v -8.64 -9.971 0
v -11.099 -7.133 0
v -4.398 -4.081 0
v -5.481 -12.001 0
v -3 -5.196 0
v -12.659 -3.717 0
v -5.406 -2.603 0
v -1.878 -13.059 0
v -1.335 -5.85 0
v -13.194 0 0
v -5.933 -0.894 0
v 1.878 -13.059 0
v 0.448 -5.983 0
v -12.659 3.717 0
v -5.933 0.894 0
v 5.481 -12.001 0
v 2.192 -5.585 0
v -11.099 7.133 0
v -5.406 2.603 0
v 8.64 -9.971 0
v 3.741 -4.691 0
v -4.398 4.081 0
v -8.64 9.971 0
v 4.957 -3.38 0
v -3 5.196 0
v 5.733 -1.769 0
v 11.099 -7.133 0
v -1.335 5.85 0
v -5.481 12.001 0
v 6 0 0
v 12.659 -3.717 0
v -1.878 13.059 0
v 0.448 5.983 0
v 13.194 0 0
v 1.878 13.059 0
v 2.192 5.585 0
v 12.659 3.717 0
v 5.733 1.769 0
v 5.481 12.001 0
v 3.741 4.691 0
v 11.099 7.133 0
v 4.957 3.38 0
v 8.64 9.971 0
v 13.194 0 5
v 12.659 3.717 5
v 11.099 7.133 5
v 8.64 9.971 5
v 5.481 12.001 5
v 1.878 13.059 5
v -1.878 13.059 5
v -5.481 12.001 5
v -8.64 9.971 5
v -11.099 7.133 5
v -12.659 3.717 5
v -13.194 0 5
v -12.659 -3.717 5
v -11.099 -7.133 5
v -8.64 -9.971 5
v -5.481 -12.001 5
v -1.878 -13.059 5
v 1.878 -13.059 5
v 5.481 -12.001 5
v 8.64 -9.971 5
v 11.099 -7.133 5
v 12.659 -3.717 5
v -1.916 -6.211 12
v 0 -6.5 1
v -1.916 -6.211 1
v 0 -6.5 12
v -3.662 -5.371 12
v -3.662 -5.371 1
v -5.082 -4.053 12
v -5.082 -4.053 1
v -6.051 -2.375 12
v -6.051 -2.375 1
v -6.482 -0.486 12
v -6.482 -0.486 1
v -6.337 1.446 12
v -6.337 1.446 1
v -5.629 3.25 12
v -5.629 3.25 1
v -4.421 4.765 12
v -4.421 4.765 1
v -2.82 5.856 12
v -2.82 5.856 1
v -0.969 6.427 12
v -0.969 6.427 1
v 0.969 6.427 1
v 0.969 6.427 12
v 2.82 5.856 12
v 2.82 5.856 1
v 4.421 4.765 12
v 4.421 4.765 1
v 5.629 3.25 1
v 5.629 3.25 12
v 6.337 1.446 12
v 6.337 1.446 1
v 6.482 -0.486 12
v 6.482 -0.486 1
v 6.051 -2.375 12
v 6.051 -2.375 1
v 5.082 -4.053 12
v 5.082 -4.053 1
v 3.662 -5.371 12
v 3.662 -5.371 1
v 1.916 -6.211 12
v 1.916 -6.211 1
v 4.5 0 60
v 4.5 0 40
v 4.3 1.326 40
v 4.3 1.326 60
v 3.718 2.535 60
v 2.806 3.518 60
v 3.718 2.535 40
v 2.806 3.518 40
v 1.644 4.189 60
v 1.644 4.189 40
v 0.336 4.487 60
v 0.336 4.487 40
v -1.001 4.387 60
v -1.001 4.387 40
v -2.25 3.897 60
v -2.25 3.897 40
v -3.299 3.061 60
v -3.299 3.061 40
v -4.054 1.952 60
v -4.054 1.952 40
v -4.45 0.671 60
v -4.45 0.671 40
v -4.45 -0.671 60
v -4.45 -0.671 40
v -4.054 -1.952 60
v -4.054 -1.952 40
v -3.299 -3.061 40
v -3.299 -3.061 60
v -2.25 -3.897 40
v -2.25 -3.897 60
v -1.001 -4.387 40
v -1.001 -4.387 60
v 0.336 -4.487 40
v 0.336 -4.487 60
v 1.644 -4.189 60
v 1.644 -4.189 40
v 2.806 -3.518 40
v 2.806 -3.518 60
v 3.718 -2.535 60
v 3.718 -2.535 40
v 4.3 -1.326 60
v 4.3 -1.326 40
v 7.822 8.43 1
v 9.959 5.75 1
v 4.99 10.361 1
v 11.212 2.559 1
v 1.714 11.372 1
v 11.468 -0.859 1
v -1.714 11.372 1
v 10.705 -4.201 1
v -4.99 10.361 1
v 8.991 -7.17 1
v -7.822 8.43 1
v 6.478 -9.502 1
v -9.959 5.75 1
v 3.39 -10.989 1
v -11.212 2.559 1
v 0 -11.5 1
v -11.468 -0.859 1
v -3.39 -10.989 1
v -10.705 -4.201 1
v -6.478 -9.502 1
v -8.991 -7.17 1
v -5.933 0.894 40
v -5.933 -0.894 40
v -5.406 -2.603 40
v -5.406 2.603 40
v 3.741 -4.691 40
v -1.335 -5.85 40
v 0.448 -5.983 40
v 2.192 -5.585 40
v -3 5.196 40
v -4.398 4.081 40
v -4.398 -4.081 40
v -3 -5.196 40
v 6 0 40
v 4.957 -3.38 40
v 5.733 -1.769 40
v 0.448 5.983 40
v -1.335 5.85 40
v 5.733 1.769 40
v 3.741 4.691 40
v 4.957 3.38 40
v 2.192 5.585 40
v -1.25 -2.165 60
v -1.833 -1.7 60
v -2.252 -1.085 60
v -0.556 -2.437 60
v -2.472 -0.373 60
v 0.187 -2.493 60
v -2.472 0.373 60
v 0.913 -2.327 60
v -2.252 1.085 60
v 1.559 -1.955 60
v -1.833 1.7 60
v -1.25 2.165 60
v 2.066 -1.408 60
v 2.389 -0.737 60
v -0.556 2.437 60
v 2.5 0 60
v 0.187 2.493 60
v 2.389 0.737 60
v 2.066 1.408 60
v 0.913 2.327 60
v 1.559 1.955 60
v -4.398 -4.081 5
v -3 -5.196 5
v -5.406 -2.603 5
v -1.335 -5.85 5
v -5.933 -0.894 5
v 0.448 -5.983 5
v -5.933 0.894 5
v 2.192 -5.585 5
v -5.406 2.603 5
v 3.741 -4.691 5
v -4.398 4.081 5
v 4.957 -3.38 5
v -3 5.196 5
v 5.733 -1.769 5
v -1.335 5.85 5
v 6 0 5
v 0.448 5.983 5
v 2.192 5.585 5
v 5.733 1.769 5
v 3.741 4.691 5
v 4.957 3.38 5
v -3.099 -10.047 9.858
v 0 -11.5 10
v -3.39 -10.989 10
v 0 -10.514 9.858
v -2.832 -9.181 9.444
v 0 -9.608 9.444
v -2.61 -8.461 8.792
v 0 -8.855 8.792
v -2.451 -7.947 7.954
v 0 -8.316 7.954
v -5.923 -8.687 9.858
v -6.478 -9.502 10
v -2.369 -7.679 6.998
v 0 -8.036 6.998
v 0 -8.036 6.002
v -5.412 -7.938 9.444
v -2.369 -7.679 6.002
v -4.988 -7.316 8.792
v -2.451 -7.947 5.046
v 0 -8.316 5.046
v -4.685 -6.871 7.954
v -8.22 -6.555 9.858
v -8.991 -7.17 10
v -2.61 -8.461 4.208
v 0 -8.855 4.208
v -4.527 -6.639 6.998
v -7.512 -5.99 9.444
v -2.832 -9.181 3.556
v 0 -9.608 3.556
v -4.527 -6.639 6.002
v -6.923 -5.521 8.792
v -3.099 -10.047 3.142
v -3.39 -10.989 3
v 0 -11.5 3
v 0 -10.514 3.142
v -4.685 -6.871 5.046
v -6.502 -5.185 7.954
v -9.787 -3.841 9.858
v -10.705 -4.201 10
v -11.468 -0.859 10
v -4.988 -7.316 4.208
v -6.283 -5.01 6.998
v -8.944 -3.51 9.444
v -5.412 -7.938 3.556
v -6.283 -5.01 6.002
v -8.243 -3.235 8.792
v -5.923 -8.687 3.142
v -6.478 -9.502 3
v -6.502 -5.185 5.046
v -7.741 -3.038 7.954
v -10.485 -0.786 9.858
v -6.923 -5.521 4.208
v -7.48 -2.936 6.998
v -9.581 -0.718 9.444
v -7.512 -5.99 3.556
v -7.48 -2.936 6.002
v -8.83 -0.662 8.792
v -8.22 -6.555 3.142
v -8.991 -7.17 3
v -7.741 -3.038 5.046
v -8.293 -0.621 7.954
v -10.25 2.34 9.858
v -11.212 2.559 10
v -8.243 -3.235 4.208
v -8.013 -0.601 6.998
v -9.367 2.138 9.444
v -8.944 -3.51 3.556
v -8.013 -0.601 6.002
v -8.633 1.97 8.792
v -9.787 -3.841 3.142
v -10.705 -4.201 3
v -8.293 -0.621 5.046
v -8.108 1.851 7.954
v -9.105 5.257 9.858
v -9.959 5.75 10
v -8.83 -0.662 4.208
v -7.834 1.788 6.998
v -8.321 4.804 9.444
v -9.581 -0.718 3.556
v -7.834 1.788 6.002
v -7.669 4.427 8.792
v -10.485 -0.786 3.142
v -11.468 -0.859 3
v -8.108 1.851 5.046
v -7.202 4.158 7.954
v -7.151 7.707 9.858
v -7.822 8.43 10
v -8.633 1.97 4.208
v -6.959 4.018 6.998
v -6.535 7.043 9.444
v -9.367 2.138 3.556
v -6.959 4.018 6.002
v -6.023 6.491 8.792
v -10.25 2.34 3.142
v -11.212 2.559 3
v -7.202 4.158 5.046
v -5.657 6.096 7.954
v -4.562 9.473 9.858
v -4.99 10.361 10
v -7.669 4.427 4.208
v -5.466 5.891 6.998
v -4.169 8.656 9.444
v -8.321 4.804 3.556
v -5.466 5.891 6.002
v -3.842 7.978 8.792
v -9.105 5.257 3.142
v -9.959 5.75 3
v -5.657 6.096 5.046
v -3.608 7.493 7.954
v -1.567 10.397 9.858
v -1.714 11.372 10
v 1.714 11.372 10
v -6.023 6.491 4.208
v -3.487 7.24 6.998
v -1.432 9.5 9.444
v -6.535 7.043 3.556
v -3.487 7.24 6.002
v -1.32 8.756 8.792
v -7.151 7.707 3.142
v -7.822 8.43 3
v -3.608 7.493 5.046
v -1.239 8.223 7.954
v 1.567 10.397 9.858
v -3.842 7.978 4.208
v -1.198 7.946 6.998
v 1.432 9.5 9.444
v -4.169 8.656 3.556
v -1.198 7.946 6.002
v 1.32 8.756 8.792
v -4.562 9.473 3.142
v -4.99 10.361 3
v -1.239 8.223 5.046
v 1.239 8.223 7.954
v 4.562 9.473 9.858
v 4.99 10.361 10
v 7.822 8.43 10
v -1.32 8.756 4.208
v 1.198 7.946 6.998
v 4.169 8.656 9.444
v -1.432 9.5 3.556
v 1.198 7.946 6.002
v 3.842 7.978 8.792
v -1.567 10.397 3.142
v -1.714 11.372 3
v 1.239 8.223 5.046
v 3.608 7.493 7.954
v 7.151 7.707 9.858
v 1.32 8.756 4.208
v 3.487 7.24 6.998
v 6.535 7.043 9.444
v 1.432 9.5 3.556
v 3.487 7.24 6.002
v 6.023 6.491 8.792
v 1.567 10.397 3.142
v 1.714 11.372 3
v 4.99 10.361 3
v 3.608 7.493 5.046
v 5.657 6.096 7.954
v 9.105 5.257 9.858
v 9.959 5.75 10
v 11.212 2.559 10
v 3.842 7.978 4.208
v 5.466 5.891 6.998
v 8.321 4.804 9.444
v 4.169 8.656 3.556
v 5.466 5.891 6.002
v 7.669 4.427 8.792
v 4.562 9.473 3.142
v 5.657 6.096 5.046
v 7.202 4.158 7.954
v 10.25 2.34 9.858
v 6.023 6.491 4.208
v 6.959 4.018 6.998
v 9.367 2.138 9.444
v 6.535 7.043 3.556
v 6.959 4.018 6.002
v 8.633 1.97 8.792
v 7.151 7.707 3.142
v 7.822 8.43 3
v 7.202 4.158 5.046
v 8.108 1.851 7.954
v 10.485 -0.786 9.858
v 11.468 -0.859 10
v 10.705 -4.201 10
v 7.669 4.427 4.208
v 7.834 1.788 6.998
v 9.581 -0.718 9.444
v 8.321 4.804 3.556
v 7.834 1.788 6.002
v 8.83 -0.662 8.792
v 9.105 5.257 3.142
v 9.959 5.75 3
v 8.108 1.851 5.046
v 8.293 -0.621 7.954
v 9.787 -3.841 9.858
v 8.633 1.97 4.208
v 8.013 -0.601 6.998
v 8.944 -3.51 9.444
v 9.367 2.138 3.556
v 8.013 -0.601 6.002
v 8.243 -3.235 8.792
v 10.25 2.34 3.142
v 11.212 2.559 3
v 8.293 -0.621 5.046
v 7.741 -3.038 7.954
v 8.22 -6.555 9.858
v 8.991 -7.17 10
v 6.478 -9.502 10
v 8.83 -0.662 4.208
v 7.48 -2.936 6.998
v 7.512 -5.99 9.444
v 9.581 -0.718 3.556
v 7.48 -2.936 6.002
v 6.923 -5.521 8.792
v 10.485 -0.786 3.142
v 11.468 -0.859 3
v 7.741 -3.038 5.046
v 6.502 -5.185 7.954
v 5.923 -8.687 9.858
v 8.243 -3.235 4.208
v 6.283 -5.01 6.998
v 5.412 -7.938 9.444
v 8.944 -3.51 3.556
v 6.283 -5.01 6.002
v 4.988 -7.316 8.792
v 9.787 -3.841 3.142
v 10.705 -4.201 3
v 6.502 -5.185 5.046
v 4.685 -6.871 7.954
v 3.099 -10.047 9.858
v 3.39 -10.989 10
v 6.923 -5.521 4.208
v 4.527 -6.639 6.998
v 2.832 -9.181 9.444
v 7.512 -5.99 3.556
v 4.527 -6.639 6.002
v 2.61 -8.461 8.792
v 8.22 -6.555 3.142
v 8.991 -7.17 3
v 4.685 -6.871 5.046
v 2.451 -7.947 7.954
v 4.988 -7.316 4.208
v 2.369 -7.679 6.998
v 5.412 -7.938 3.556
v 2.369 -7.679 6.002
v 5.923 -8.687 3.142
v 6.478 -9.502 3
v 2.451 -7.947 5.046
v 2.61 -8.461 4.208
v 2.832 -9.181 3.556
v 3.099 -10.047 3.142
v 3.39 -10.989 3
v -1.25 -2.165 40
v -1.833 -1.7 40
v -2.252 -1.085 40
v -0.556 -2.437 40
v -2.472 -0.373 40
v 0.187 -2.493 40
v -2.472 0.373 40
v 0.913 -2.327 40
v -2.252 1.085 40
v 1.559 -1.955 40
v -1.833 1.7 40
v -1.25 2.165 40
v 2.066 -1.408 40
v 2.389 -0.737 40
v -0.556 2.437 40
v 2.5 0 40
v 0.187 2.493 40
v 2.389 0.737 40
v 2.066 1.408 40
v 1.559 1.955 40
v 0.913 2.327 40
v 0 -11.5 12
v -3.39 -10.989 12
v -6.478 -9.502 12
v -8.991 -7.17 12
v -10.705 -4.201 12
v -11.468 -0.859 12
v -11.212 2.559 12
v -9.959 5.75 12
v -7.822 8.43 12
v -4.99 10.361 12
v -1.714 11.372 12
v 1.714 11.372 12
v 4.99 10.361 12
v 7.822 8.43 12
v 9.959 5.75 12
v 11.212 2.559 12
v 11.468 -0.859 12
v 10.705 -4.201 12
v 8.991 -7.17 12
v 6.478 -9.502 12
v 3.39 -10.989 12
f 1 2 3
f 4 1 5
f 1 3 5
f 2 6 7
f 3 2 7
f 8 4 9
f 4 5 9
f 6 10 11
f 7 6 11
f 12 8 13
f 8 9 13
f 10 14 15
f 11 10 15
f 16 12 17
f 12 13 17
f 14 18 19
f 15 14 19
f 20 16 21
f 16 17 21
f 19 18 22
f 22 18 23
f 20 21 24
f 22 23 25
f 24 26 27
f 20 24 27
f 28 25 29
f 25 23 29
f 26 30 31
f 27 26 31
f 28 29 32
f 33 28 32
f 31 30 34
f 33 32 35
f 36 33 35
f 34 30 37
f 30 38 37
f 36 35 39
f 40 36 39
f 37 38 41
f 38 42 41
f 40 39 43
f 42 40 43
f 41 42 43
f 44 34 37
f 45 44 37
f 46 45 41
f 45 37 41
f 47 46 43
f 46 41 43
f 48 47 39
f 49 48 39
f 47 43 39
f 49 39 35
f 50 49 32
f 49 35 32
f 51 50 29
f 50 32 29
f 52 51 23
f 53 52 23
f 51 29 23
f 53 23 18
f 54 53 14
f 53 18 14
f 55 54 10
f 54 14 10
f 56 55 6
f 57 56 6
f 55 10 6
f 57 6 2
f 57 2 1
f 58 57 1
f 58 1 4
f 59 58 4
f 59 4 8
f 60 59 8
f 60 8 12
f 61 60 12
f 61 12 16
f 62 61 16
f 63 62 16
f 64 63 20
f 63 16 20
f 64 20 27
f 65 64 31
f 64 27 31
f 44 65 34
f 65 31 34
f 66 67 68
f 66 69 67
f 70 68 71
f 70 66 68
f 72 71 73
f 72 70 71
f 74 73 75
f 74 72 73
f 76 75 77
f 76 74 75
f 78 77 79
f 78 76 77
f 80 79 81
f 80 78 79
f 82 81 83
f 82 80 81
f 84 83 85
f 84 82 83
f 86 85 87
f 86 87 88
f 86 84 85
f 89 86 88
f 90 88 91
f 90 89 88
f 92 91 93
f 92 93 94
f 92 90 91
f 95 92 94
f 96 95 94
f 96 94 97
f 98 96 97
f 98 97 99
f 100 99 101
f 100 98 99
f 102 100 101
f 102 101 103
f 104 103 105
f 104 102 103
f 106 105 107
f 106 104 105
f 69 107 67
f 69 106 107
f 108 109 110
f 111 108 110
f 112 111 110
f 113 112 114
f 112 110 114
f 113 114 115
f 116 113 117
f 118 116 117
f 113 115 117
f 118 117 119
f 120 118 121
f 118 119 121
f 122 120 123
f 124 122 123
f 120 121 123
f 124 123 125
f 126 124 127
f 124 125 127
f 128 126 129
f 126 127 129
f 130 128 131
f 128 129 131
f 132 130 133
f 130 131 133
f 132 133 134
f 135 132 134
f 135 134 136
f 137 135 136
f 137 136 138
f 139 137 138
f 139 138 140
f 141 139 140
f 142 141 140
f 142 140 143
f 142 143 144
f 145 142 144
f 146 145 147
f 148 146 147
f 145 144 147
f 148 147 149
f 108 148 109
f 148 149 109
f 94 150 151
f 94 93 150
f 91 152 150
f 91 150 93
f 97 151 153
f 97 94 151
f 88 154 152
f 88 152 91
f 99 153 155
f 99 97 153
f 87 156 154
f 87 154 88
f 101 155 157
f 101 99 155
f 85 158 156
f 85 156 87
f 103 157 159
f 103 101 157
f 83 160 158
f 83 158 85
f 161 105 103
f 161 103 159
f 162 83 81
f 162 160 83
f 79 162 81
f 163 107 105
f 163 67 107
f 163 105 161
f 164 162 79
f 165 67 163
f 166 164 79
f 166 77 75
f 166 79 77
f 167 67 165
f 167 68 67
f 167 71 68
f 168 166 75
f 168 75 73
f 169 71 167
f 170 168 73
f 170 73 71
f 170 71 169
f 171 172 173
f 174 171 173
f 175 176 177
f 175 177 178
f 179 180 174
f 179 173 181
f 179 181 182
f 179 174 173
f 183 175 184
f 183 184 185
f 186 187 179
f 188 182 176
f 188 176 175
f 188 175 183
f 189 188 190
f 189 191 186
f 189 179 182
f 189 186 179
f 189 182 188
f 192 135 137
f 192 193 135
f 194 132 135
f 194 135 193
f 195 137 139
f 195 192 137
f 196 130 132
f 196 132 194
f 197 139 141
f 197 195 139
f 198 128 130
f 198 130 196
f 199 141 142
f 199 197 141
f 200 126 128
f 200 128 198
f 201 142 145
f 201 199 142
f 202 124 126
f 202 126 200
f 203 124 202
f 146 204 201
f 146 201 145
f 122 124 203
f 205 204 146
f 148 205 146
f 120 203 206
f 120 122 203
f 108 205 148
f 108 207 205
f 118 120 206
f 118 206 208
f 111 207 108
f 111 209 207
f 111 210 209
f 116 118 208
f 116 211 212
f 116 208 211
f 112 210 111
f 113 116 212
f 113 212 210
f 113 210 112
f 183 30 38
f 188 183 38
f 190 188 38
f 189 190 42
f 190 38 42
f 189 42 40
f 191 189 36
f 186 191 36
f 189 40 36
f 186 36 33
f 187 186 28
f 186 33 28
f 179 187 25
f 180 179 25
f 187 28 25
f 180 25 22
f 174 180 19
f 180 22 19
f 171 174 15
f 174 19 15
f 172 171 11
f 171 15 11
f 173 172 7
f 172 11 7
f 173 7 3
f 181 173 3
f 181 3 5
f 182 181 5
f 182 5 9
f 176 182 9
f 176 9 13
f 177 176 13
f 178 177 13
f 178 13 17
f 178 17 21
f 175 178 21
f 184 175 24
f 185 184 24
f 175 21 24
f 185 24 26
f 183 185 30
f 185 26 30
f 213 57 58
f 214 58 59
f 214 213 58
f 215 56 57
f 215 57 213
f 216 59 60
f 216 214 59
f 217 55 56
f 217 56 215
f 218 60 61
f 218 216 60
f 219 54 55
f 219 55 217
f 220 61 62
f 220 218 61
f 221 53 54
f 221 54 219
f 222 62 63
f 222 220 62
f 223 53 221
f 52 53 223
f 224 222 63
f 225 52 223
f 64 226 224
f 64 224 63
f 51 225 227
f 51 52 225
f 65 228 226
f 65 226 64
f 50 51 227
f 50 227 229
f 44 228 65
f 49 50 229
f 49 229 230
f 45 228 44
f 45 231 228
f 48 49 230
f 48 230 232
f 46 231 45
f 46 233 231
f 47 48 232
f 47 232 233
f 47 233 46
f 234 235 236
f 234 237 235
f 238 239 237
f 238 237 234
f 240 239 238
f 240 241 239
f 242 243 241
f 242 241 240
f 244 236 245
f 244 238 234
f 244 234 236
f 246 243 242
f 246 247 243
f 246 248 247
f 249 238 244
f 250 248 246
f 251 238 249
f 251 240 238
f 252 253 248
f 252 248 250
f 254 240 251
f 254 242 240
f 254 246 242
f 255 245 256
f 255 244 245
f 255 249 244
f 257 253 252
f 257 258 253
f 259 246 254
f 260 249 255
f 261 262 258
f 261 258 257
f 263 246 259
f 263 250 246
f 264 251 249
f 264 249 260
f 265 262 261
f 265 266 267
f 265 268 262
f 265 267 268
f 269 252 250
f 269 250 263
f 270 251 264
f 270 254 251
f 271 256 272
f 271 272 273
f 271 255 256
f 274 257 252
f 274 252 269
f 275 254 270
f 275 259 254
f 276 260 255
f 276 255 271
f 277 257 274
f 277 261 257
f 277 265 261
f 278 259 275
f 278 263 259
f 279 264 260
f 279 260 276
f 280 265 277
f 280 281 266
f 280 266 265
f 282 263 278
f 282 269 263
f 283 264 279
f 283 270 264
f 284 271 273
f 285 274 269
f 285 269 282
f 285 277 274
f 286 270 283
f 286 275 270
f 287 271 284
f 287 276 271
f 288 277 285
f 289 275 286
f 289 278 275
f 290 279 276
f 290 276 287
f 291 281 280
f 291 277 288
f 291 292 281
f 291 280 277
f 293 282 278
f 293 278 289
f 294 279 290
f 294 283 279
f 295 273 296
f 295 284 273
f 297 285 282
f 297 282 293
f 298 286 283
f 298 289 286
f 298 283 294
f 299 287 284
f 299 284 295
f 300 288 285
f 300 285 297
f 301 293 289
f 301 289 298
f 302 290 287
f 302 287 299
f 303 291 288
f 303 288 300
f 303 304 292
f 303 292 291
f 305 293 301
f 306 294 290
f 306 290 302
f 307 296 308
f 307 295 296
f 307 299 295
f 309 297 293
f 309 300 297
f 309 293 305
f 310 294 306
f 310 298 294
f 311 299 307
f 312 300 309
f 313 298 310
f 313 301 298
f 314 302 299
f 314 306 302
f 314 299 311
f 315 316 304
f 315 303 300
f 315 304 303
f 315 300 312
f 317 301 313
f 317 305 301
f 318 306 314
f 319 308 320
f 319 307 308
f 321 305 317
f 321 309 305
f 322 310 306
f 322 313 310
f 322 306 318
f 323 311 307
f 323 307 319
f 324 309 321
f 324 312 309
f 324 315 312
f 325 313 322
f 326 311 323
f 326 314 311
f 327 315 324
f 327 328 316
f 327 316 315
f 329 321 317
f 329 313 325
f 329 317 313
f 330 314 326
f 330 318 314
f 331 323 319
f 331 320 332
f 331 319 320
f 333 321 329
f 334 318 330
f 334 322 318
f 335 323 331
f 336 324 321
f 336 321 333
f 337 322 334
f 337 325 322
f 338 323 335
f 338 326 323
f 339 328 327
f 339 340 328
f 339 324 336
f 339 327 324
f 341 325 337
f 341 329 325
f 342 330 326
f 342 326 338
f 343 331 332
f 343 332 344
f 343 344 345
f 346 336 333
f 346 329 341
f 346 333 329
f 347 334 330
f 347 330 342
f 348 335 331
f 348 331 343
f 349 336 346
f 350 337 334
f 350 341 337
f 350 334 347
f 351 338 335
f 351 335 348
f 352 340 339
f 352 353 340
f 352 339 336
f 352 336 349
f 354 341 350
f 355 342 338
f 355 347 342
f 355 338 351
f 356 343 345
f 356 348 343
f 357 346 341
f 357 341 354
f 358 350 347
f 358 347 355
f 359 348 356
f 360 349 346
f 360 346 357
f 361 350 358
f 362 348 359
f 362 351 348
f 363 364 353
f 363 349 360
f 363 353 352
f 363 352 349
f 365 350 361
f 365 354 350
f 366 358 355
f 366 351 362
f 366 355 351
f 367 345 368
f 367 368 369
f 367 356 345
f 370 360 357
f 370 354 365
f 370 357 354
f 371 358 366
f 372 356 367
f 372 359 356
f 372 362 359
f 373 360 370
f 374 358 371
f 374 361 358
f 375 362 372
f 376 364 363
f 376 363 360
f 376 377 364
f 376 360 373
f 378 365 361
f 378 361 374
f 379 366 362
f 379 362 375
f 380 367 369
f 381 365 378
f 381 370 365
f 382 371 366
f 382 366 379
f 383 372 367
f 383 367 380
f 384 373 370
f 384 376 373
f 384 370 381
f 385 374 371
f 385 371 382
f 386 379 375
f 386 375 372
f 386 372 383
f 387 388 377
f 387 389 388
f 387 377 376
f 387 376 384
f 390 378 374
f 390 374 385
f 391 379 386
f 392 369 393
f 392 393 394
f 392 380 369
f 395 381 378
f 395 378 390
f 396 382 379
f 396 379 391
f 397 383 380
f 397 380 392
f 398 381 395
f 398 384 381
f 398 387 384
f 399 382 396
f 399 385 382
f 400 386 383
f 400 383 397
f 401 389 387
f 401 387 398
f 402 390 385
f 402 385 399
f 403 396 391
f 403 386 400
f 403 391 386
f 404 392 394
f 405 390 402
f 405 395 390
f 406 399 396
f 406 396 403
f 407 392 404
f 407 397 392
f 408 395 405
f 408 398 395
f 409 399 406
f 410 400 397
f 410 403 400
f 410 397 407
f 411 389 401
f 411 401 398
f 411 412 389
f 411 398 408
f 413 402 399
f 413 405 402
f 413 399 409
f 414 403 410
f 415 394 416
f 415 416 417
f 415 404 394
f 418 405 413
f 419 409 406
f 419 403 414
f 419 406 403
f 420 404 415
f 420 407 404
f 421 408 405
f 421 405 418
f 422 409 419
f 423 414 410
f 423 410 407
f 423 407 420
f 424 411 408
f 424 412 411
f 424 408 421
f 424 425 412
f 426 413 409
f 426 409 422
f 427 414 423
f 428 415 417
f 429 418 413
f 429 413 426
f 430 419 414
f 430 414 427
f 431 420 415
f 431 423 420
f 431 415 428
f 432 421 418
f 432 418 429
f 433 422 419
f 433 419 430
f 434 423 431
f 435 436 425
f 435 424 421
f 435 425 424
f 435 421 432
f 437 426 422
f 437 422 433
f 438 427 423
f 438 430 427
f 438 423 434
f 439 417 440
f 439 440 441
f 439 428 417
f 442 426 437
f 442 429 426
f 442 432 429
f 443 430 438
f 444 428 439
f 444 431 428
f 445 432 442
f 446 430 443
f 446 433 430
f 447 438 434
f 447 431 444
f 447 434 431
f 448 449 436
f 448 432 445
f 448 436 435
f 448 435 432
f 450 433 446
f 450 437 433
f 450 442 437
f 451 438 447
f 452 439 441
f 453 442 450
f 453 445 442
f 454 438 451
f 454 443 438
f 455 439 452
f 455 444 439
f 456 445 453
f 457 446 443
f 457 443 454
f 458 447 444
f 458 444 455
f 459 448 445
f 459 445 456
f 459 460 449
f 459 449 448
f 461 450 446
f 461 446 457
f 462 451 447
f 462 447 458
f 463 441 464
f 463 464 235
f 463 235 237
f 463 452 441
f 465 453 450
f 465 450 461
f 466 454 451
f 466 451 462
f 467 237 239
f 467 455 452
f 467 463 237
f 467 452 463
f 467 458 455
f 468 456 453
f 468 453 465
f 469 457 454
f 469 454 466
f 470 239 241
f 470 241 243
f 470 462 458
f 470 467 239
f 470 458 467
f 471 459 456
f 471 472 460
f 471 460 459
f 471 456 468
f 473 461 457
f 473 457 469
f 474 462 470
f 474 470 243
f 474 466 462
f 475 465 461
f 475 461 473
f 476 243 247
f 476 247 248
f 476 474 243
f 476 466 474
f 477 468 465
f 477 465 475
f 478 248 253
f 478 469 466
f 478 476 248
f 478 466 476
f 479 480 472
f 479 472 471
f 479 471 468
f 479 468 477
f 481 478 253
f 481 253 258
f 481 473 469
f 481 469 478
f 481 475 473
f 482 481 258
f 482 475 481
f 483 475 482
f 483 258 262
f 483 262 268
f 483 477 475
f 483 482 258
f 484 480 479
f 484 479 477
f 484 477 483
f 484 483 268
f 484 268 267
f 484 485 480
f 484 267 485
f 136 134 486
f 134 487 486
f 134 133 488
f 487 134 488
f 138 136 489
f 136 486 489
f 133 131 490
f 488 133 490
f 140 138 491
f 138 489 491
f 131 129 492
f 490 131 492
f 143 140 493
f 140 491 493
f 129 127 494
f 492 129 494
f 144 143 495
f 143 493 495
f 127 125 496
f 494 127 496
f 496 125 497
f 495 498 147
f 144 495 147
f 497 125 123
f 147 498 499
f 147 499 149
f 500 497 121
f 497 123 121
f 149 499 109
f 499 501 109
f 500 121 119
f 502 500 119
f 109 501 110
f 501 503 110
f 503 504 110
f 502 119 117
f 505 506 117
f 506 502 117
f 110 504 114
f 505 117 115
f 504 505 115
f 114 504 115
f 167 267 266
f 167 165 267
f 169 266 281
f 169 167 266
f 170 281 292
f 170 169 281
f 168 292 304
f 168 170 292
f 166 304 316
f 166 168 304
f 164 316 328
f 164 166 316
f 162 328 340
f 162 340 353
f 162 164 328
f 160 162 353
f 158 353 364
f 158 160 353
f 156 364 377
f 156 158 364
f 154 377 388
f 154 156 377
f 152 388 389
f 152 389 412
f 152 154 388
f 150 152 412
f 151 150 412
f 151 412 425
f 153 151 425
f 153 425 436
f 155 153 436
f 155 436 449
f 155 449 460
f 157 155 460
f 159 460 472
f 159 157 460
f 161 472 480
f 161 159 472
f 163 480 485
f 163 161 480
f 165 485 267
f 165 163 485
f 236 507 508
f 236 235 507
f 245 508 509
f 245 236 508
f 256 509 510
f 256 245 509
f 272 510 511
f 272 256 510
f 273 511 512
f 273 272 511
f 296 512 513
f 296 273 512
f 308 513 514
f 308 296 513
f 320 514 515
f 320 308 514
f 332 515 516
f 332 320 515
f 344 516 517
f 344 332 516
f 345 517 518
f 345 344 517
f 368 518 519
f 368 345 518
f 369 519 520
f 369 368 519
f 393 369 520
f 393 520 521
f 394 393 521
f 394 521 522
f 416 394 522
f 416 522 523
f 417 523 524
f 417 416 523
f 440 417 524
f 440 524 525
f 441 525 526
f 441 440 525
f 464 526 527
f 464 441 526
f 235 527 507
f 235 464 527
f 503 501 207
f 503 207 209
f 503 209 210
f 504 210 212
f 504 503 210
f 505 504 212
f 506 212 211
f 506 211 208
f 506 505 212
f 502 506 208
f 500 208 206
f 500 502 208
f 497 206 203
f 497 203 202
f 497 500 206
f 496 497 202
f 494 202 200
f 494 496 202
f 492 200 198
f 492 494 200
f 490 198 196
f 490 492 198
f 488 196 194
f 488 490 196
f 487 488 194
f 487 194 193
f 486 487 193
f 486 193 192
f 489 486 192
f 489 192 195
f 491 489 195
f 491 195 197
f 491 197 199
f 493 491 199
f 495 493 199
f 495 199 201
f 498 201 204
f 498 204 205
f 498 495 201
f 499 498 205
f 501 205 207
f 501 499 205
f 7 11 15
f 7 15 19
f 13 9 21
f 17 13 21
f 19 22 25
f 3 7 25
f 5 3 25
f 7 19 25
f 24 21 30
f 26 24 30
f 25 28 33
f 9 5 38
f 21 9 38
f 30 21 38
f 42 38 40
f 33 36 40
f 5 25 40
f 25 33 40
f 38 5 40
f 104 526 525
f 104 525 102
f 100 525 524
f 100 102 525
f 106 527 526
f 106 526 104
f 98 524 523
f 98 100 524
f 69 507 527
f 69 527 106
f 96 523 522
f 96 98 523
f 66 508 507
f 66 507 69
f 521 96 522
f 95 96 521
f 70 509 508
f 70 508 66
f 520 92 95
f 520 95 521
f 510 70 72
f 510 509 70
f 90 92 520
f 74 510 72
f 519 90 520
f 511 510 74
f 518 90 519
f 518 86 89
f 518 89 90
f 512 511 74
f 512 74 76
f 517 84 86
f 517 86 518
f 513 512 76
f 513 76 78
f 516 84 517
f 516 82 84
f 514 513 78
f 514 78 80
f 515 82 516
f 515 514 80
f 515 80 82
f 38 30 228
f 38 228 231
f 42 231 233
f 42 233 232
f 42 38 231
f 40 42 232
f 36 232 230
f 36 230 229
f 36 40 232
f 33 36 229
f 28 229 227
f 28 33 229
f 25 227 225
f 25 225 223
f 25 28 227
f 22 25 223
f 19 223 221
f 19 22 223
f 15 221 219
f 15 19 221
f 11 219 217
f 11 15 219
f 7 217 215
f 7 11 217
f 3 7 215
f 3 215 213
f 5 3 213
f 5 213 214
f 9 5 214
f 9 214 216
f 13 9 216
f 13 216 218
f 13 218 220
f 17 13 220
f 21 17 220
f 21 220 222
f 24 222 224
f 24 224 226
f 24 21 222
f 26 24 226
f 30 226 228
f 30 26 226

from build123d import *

# Parameters (mm, degrees)
F0_R     = 6
F1_DEPTH = 40
F3_R     = 4.5
F3_R_2   = 2.5
F4_DEPTH = 20
F0_R_2   = 13.1937102496
F8_DEPTH = 5


with BuildPart() as f1:
    # F0 (on Top) → F1 (new body)
    with BuildSketch(Plane.XY):
        Circle(F0_R)
    extrude(amount=F1_DEPTH)


with BuildPart() as f4:
    # F3 (on offset) → F4 (new body)
    with BuildSketch(Plane.XY.offset(40)):
        Circle(F3_R)
        Circle(F3_R_2, mode=Mode.SUBTRACT)
    extrude(amount=F4_DEPTH)


with BuildPart() as f7:
    # F6 (on Right) → F7 (revolve)
    with BuildSketch(Plane.YZ):
        with BuildLine():
            Line((-11.4999981597, 1.0000000475), (-6.4999981597, 1.0000000475))
            Line((-6.4999981597, 1.0000000475), (-6.4999981597, 12.0000000475))
            Line((-6.4999981597, 12.0000000475), (-11.4999981597, 12.0000000475))
            Line((-11.4999981597, 12.0000000475), (-11.4999981597, 10.0000000475))
            ThreePointArc((-11.4999981597, 10.0000000475), (-7.9999981597, 6.5000000475), (-11.4999981597, 3.0000000475))
            Line((-11.4999981597, 3.0000000475), (-11.4999981597, 1.0000000475))
        make_face()
    revolve(axis=Axis((0, 0, 0), (0, 0, -1)))


with BuildPart() as f8:
    # F0 (on Top) → F8 (new body)
    with BuildSketch(Plane.XY):
        Circle(F0_R_2)
        Circle(F0_R, mode=Mode.SUBTRACT)
    extrude(amount=F8_DEPTH)


solid = Compound([f1.part, f4.part, f7.part, f8.part])
